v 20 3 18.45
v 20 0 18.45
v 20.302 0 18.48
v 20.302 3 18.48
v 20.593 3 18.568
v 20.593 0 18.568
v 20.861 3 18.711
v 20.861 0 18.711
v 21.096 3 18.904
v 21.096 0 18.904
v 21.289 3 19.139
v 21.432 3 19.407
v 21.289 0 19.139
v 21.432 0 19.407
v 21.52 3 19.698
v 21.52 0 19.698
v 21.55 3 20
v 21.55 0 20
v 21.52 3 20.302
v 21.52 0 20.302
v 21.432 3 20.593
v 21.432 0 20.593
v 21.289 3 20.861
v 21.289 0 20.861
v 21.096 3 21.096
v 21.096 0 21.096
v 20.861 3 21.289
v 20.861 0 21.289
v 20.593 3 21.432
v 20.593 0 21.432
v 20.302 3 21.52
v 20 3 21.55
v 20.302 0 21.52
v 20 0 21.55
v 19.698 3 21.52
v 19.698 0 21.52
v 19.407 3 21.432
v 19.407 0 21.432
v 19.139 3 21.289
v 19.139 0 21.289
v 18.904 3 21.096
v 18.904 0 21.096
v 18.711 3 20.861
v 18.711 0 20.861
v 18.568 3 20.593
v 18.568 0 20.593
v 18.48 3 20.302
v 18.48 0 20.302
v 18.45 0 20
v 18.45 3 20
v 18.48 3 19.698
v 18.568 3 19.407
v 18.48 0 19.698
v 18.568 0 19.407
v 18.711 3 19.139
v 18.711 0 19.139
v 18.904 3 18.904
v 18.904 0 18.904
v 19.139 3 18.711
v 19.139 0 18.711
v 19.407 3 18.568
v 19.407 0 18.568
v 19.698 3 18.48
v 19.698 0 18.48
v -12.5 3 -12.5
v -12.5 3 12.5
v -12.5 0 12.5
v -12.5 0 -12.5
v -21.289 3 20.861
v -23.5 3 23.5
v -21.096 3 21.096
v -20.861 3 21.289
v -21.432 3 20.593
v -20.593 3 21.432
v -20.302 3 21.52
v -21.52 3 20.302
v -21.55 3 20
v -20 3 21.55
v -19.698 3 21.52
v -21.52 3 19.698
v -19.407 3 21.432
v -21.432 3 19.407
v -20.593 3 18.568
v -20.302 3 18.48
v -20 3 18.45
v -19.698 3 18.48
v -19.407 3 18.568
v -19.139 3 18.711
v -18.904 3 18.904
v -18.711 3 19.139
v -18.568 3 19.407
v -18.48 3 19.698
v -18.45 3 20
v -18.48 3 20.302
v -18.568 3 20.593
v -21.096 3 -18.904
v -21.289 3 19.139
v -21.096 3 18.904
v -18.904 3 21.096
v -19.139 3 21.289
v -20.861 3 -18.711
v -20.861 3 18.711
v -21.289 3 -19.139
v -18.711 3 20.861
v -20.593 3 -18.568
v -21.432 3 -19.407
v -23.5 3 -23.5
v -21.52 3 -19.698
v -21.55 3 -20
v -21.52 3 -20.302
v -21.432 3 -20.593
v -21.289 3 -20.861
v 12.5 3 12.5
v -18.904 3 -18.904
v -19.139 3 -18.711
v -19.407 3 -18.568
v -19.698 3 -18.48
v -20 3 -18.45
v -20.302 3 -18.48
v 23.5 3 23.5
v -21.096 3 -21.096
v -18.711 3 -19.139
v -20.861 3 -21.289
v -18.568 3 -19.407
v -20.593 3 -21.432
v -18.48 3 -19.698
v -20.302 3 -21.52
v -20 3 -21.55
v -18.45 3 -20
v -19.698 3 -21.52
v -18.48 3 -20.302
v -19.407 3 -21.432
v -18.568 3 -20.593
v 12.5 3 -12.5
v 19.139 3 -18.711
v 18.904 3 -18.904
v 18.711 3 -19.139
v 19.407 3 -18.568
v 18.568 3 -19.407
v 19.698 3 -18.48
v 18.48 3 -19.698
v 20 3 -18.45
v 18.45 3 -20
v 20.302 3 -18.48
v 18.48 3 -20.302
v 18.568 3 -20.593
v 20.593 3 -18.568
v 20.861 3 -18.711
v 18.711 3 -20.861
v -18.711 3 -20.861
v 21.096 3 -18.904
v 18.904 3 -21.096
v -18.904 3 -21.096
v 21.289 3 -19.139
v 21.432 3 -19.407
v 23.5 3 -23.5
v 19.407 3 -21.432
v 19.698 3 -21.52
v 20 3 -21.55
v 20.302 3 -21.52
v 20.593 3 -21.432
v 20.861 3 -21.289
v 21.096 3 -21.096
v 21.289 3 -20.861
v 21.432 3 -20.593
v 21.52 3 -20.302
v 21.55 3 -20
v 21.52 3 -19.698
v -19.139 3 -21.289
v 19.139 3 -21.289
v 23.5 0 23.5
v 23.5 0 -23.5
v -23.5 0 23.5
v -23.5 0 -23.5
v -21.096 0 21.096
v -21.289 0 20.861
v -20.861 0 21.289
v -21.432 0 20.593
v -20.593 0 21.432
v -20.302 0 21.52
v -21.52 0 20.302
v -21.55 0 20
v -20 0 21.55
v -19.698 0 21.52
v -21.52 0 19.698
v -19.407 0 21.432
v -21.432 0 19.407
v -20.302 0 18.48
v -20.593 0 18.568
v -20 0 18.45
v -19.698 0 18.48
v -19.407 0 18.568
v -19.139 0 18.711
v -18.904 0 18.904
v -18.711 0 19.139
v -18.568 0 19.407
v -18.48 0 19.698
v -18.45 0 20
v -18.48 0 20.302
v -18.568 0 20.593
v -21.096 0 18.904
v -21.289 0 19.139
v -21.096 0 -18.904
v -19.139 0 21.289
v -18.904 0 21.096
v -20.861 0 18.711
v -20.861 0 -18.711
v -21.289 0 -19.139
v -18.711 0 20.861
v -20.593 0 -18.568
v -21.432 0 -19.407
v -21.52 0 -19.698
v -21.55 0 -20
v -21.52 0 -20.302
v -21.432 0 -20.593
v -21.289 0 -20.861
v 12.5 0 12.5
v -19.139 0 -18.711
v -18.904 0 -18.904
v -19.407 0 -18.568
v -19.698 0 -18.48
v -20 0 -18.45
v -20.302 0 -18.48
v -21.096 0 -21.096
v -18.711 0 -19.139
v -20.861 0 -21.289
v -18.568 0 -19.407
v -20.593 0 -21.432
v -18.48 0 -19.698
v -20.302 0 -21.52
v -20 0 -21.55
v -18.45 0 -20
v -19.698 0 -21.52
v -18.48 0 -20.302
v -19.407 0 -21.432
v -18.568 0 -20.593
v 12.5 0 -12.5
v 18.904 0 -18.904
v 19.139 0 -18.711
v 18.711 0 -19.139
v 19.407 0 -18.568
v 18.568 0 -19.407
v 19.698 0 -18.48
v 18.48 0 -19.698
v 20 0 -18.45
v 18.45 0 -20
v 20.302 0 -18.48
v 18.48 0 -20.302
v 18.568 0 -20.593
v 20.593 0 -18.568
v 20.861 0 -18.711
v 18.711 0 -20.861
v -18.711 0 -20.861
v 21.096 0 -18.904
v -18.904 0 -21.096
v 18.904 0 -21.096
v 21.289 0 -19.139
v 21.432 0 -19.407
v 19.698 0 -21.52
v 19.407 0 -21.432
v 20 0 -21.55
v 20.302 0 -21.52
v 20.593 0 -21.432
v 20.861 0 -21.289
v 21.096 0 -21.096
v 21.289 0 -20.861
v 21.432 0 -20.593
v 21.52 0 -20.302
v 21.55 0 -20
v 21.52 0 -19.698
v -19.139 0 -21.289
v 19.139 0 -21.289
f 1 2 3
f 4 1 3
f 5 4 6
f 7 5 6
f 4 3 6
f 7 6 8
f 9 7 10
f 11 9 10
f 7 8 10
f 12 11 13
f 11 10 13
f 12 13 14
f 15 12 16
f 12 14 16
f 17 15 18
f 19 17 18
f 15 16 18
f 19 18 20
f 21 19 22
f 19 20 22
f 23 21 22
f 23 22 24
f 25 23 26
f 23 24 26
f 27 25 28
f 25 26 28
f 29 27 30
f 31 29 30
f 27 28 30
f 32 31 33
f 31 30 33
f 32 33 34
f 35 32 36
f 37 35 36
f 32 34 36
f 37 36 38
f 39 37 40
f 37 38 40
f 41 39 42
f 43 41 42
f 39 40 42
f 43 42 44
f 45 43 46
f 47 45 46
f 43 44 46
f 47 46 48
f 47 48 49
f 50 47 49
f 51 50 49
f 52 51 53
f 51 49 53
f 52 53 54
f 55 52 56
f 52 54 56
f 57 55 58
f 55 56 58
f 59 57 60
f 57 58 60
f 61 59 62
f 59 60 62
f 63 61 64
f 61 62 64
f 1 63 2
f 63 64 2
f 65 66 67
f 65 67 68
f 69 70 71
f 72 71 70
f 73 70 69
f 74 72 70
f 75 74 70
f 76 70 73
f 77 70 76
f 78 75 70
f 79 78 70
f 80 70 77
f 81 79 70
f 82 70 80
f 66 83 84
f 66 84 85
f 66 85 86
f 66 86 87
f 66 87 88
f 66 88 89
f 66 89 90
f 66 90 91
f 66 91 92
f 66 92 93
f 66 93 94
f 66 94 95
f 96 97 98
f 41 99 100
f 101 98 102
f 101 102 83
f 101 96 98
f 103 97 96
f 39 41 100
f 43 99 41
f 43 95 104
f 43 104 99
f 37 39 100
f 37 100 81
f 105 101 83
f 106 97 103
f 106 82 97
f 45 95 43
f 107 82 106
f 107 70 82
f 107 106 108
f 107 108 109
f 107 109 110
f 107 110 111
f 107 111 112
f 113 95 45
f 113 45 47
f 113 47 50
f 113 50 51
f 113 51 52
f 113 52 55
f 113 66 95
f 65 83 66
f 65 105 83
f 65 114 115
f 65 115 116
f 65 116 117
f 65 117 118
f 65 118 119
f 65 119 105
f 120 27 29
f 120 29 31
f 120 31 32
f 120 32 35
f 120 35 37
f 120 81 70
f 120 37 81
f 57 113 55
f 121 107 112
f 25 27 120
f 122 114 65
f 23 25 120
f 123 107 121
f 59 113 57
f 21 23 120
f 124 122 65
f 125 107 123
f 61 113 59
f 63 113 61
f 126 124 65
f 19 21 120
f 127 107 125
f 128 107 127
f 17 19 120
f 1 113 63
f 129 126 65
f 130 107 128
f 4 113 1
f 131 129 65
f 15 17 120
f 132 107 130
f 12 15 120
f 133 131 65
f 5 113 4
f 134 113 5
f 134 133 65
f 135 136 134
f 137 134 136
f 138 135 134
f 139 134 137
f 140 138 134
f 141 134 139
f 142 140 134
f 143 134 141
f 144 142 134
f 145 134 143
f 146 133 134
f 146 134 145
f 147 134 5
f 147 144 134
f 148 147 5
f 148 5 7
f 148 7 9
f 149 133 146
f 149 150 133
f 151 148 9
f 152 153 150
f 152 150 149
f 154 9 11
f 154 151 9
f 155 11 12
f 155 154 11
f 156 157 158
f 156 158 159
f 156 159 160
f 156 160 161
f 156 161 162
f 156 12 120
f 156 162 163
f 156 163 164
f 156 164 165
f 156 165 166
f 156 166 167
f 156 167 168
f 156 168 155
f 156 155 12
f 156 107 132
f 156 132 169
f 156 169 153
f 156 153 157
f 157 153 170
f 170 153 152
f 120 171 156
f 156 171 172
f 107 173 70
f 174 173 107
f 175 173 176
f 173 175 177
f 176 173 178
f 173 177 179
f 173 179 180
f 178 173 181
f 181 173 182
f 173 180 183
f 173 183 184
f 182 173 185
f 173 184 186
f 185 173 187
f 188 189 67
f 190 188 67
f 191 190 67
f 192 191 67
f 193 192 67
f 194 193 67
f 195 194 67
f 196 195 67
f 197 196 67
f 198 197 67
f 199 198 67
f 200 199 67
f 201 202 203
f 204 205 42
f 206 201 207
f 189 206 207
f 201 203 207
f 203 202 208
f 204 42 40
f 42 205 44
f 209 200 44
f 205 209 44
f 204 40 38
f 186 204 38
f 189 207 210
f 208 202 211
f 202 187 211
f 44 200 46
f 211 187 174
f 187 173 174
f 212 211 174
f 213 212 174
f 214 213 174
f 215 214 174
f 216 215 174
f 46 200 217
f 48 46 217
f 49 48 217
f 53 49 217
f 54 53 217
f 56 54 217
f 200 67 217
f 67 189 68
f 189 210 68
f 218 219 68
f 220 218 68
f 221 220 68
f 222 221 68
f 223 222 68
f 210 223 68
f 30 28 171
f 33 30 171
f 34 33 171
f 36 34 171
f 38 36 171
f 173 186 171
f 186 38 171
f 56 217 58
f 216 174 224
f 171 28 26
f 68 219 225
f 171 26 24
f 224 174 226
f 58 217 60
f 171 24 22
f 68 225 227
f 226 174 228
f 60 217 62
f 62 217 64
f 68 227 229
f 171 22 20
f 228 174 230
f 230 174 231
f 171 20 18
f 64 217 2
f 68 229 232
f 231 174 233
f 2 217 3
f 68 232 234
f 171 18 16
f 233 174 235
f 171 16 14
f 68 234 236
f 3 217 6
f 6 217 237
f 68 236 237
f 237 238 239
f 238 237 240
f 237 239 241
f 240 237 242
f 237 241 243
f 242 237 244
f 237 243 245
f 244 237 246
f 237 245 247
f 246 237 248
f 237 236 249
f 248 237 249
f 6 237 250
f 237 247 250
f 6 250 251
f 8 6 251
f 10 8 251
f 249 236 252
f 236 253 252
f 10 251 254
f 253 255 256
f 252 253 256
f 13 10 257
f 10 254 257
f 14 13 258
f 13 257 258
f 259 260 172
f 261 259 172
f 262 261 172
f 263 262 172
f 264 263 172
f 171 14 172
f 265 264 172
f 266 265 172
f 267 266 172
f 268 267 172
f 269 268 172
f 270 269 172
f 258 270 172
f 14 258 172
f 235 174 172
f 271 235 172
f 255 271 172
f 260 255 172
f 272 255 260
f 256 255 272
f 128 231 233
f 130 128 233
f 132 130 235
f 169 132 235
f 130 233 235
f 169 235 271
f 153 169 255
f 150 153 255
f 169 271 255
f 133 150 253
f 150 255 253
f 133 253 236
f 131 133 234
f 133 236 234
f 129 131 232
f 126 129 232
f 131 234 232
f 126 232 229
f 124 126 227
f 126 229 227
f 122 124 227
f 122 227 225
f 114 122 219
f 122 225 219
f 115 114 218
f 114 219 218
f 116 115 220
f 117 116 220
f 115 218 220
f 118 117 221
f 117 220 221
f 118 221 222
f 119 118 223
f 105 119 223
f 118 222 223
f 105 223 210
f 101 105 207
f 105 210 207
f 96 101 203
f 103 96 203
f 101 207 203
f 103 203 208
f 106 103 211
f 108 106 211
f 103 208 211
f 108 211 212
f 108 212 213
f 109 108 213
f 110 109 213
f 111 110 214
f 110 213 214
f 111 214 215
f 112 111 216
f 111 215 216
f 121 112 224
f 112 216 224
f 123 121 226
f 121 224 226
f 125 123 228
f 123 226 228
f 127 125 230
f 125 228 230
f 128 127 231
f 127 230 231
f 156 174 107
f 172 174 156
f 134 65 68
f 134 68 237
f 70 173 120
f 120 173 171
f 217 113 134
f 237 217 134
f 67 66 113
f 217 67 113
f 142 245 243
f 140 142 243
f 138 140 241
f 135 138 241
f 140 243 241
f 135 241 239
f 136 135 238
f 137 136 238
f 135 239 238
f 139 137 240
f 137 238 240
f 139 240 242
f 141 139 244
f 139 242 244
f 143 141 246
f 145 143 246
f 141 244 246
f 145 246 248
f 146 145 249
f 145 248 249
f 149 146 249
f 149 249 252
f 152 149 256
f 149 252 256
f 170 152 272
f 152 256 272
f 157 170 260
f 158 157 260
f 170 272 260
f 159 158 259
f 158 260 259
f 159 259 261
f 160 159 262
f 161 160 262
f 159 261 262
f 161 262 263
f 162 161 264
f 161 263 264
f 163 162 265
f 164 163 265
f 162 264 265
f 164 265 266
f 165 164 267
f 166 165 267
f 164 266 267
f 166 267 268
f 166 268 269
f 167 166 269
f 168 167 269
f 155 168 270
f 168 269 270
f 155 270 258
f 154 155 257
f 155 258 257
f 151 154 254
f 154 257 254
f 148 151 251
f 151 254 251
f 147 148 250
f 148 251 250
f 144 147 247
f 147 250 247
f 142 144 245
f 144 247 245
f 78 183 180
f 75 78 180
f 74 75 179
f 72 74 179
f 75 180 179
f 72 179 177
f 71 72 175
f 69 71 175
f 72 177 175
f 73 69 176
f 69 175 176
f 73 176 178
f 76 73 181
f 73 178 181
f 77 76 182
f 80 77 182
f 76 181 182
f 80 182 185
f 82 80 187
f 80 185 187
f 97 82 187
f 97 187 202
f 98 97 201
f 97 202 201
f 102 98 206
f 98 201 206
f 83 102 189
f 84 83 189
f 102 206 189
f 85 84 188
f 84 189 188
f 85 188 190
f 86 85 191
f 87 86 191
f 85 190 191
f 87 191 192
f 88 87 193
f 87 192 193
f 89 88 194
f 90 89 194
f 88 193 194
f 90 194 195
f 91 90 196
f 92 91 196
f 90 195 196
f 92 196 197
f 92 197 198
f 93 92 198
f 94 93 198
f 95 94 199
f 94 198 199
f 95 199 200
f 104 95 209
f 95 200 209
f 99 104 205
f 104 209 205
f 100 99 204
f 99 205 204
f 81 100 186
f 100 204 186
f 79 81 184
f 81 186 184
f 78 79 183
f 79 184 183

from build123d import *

# Parameters (mm, degrees)
SKETCH_1_W          = 47
SKETCH_1_H          = 47
EXTRUDE_1_DEPTH     = 3
SKETCH_2_W          = 25
SKETCH_2_H          = 25
CUT_EXTRUDE_1_DEPTH = 3
SKETCH_3_R          = 1.55
CUT_EXTRUDE_2_DEPTH = 3


with BuildPart() as part:
    # 草图1 → 凸台-拉伸1 (new body)
    with BuildSketch(Plane(origin=(0, 0, 0), x_dir=(1, 0, 0), z_dir=(0, 1, 0))):
        Rectangle(SKETCH_1_W, SKETCH_1_H)
    extrude(amount=EXTRUDE_1_DEPTH)

    # 草图2 → 切除-拉伸1 (cut)
    with BuildSketch(Plane(origin=(0, 3, 0), x_dir=(1, 0, 0), z_dir=(0, 1, 0))):
        Rectangle(SKETCH_2_W, SKETCH_2_H)
    extrude(amount=-CUT_EXTRUDE_1_DEPTH, mode=Mode.SUBTRACT)

    # 草图3 → 切除-拉伸2 (cut)
    with BuildSketch(Plane.XZ):
        with Locations(Location((20, 20, 0), (0, 0, 270))):
            Circle(SKETCH_3_R)
        with Locations(Location((-20, 20, 0), (0, 0, 90))):
            Circle(SKETCH_3_R)
        with Locations(Location((20, -20, 0), (0, 0, 90))):
            Circle(SKETCH_3_R)
        with Locations(Location((-20, -20, 0), (0, 0, 270))):
            Circle(SKETCH_3_R)
    extrude(amount=-CUT_EXTRUDE_2_DEPTH, mode=Mode.SUBTRACT)


solid = part.part
